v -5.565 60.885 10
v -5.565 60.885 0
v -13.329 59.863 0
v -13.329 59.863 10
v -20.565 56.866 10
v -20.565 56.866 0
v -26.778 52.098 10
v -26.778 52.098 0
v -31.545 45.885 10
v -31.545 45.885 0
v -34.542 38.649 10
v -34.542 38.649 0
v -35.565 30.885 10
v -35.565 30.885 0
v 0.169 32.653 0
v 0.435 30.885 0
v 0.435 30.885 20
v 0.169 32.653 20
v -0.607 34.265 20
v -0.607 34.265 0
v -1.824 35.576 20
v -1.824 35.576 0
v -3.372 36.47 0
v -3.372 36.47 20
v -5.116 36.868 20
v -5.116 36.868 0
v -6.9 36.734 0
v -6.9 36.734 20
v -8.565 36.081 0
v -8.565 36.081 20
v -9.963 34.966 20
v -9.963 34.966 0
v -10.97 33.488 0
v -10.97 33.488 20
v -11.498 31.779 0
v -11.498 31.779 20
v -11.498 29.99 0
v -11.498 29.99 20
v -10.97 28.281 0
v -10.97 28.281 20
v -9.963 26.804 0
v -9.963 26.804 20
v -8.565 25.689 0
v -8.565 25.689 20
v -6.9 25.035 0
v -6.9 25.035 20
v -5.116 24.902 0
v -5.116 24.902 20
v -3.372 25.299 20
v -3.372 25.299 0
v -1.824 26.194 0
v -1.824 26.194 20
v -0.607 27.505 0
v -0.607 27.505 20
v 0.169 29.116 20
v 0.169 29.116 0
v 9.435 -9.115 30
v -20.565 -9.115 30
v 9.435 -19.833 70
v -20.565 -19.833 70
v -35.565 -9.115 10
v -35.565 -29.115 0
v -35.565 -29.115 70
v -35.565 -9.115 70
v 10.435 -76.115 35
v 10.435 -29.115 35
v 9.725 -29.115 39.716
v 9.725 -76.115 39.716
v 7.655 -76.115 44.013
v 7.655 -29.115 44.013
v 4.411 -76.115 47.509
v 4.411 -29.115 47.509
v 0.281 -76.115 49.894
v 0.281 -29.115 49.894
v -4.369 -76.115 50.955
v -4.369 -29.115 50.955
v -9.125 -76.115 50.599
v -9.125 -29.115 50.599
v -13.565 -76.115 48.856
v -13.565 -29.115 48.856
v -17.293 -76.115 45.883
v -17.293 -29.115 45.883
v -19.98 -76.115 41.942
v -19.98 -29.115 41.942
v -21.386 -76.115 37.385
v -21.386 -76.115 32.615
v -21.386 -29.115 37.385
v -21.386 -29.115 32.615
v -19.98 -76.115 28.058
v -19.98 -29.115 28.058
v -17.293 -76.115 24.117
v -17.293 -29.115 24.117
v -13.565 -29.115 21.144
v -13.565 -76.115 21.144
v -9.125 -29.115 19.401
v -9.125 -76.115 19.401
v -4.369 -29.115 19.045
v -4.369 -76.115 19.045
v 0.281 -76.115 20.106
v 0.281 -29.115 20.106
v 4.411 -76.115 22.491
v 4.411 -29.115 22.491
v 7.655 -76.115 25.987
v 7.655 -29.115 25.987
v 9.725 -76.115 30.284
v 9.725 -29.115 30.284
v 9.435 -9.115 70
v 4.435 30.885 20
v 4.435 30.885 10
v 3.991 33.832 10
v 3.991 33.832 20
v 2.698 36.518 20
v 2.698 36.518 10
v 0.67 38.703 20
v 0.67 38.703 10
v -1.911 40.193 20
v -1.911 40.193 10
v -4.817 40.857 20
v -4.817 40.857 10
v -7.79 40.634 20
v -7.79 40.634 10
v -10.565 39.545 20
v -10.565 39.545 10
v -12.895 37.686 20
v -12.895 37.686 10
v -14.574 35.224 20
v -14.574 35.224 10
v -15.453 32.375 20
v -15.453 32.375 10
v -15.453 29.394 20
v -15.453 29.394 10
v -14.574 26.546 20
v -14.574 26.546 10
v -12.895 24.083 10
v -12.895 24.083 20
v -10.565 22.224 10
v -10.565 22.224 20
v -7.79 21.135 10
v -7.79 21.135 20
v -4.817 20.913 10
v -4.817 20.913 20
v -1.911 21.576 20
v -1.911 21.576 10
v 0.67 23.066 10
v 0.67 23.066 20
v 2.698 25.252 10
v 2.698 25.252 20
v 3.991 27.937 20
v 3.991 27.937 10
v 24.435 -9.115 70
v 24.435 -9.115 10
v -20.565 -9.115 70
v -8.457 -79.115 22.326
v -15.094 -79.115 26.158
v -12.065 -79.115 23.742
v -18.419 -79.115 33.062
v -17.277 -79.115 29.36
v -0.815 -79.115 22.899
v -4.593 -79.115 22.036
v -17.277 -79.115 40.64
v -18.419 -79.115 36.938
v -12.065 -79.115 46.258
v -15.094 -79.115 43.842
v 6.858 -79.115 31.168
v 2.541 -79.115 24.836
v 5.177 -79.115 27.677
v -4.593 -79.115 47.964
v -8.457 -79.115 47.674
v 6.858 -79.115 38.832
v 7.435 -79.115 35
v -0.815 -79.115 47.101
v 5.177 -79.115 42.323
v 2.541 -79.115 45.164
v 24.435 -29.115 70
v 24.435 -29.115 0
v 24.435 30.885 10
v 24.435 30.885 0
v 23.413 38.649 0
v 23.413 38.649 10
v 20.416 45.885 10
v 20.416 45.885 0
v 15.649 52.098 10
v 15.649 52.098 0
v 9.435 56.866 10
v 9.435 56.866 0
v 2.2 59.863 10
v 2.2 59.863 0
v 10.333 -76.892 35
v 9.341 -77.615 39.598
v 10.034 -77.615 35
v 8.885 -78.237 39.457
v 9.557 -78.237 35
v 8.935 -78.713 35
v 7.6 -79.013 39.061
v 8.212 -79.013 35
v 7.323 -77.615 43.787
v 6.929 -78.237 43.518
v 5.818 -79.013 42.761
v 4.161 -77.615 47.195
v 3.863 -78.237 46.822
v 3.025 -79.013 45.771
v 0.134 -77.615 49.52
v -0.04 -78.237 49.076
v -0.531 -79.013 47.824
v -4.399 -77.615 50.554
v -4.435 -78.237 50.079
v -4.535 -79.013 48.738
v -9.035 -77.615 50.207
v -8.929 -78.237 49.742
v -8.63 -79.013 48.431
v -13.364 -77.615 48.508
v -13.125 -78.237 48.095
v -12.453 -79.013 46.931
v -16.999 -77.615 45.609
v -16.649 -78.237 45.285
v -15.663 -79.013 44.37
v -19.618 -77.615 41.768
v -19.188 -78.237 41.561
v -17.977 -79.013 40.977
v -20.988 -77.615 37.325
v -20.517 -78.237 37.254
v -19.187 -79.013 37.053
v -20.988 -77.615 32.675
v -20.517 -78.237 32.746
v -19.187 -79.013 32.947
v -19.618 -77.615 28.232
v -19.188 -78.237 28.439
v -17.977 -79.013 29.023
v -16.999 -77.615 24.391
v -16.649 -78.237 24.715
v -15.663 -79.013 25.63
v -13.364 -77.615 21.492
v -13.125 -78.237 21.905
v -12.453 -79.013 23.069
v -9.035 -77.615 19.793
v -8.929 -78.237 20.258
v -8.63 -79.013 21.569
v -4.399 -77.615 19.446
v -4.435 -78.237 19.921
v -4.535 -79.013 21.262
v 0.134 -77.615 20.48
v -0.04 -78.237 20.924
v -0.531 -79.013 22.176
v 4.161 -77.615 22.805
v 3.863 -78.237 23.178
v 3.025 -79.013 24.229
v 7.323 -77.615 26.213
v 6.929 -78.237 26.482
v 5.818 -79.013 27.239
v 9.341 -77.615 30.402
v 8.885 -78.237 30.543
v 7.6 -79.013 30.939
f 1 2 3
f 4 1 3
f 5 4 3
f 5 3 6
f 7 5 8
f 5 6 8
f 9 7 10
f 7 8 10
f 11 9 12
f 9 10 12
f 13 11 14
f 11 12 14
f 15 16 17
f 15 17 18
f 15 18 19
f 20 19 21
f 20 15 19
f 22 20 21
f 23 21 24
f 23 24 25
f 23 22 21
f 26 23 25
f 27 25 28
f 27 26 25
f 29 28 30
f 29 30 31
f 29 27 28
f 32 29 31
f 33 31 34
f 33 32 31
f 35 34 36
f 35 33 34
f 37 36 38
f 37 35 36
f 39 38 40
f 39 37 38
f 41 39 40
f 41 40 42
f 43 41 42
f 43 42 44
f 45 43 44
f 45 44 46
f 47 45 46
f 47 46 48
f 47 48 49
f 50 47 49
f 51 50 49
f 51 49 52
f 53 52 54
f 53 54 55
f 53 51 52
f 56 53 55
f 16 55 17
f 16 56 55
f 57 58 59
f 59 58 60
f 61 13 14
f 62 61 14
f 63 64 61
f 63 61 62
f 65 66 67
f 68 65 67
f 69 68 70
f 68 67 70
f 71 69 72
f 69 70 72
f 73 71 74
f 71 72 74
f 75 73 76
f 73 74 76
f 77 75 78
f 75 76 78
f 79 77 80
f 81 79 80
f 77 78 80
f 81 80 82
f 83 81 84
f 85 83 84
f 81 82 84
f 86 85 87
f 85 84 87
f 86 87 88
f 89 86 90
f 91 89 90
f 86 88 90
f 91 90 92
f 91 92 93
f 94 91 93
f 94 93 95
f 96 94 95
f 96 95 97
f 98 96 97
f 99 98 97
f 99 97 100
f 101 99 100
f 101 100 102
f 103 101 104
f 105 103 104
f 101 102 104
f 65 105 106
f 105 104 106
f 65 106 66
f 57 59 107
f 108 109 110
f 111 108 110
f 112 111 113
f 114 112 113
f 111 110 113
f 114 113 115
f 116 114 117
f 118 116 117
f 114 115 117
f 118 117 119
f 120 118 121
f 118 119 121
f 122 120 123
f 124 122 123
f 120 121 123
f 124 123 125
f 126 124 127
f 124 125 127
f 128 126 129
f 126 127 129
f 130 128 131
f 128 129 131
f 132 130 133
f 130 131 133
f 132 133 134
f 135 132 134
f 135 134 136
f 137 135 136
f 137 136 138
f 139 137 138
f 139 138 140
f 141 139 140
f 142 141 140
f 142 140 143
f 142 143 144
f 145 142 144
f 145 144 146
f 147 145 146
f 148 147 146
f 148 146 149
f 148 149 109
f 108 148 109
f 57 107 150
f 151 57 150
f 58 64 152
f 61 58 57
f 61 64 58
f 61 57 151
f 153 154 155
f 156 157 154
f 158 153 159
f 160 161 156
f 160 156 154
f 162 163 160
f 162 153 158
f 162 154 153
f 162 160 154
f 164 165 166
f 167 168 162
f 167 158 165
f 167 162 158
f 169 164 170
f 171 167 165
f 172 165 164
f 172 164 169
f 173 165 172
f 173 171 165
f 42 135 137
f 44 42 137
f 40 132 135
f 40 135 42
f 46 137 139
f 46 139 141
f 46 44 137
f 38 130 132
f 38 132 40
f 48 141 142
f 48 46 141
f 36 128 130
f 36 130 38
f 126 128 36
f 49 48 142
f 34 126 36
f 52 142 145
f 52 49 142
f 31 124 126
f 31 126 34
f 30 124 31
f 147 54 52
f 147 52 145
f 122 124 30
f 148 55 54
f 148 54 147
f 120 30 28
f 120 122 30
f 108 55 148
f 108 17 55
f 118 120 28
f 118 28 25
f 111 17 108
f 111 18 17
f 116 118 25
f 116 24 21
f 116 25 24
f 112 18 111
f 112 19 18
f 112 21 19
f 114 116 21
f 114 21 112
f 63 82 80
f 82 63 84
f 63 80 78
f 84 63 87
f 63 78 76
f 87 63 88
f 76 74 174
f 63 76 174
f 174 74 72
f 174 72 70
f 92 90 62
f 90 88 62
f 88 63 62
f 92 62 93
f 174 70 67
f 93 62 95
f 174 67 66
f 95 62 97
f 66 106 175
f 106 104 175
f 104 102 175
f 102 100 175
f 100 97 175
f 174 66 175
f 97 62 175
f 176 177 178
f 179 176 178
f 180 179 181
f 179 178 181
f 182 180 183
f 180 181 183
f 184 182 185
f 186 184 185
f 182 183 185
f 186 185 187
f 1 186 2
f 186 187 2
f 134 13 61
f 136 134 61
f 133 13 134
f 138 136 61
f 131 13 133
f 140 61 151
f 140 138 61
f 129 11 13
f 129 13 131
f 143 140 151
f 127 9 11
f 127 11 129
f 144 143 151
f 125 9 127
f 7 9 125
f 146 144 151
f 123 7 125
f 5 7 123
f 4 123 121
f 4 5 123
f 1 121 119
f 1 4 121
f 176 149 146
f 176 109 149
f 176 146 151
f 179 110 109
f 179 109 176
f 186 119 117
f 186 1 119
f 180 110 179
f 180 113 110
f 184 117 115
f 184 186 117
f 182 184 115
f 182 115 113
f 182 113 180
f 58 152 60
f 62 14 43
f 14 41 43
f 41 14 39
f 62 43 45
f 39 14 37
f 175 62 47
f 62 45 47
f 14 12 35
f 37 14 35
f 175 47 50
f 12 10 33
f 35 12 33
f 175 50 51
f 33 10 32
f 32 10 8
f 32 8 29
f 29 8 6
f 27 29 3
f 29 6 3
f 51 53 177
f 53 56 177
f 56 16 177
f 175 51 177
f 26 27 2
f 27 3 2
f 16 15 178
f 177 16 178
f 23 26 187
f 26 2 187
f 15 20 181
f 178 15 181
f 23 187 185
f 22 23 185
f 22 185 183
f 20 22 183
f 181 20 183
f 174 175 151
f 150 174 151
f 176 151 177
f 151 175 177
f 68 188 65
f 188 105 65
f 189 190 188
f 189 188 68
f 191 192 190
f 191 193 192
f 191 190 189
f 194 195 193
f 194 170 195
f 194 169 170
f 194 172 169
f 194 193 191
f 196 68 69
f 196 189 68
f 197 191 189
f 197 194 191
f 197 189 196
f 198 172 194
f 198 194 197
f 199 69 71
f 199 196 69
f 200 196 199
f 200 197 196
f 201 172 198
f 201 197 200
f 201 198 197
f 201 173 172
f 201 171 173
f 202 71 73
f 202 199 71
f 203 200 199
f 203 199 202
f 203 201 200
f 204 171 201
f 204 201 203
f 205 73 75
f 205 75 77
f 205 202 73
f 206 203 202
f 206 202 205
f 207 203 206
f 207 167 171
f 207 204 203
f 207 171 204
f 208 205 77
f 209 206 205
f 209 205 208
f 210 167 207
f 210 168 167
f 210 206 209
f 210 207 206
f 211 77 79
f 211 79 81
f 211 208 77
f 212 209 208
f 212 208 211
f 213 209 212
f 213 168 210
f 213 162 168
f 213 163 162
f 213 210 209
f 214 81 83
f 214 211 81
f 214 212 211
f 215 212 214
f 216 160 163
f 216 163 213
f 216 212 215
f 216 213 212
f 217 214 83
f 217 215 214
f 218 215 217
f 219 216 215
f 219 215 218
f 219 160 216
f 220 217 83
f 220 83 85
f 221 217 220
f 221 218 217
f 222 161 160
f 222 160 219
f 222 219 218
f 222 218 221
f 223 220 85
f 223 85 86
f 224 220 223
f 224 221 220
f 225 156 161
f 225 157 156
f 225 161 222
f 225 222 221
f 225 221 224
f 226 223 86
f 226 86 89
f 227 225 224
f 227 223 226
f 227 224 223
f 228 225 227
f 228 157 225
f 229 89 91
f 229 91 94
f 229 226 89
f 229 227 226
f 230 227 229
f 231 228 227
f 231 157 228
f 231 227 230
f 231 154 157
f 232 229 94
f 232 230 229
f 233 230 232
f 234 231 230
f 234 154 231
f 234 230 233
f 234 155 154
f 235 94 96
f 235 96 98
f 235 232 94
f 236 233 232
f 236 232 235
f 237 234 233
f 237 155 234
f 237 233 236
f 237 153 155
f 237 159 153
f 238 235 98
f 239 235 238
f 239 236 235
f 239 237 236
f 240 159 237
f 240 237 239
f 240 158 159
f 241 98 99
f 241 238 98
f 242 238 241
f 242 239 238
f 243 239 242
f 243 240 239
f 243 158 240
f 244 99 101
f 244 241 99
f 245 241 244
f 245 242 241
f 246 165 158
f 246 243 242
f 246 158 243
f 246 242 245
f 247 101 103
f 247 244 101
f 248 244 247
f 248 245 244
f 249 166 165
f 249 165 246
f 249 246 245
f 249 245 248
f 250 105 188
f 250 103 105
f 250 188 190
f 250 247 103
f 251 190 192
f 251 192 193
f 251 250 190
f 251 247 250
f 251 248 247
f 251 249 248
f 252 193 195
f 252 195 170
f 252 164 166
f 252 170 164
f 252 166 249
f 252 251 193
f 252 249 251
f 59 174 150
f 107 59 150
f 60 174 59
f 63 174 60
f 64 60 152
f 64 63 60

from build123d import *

# Parameters (mm, degrees)
F0_R      = 10
F1_DEPTH  = 10
F0_R_2    = 6
F2_DEPTH  = 20
F0_W      = 60
F0_H      = 20
F3_DEPTH  = 70
F4_R      = 16
F5_DEPTH  = 50
F6_R      = 3
F9_DEPTH  = 77.2
F10_DEPTH = 15
F11_DEPTH = 15


with BuildPart() as f1:
    # F0 (on Top) → F1 (new body)
    with BuildSketch(Plane.XY):
        with BuildLine():
            ThreePointArc((-5.564519, 60.884742), (-26.777723, 52.097945), (-35.564519, 30.884742))
            Line((-35.564519, 30.884742), (-35.564519, -9.115258))
            Line((-35.564519, -9.115258), (24.435481, -9.115258))
            Line((24.435481, -9.115258), (24.435481, 30.884742))
            ThreePointArc((24.435481, 30.884742), (15.648684, 52.097945), (-5.564519, 60.884742))
        make_face()
        with Locations((-5.564519, 30.884742)):
            Circle(F0_R, mode=Mode.SUBTRACT)
    extrude(amount=F1_DEPTH)

    # F0 (on Top) → F2 (join)
    with BuildSketch(Plane.XY):
        with Locations((-5.564519, 30.884742)):
            Circle(F0_R)
        with Locations((-5.564519, 30.884742)):
            Circle(F0_R_2, mode=Mode.SUBTRACT)
    extrude(amount=F2_DEPTH)

    # F0 (on Top) → F3 (join)
    with BuildSketch(Plane.XY):
        with Locations((-5.564519, -19.115258)):
            Rectangle(F0_W, F0_H)
    extrude(amount=F3_DEPTH)

    # F4 (on face) → F5 (join)
    with BuildSketch(Plane.XZ.offset(29.115258)):
        with Locations((-5.564519, 35)):
            Circle(F4_R)
    extrude(amount=F5_DEPTH)

    # F6
    f6_edges = [f1.edges().sort_by_distance(p)[0] for p in [
        (-21.564519, -79.115258, 35),
    ]]
    fillet(f6_edges, radius=F6_R)

    # F8 (on face) → F9 (cut)
    with BuildSketch(Plane(origin=(-35.564519, 0, 0), x_dir=(0, -1, 0), z_dir=(-1, 0, 0))):
        Polygon((19.833226, 70), (9.115258, 70), (9.115258, 30), align=None)
    extrude(amount=-F9_DEPTH, mode=Mode.SUBTRACT)

    # F8 (on face) → F10 (join)
    with BuildSketch(Plane(origin=(-35.564519, 0, 0), x_dir=(0, -1, 0), z_dir=(-1, 0, 0))):
        Polygon((19.833226, 70), (9.115258, 70), (9.115258, 30), align=None)
        Polygon((19.833226, 70), (9.115258, 30), (9.115258, 10), (-30.884742, 10), (-30.884742, 0), (29.115258, 0), (29.115258, 70), align=None)
    extrude(amount=-F10_DEPTH)

    # F7 (on face) → F11 (join)
    with BuildSketch(Plane.YZ.offset(24.435481)):
        Polygon((-9.115258, 10), (-9.115258, 30), (-19.833226, 70), (-29.115258, 70), (-29.115258, 0), (30.884742, 0), (30.884742, 10), align=None)
        Polygon((-9.115258, 30), (-9.115258, 70), (-19.833226, 70), align=None)
    extrude(amount=-F11_DEPTH)


solid = f1.part
